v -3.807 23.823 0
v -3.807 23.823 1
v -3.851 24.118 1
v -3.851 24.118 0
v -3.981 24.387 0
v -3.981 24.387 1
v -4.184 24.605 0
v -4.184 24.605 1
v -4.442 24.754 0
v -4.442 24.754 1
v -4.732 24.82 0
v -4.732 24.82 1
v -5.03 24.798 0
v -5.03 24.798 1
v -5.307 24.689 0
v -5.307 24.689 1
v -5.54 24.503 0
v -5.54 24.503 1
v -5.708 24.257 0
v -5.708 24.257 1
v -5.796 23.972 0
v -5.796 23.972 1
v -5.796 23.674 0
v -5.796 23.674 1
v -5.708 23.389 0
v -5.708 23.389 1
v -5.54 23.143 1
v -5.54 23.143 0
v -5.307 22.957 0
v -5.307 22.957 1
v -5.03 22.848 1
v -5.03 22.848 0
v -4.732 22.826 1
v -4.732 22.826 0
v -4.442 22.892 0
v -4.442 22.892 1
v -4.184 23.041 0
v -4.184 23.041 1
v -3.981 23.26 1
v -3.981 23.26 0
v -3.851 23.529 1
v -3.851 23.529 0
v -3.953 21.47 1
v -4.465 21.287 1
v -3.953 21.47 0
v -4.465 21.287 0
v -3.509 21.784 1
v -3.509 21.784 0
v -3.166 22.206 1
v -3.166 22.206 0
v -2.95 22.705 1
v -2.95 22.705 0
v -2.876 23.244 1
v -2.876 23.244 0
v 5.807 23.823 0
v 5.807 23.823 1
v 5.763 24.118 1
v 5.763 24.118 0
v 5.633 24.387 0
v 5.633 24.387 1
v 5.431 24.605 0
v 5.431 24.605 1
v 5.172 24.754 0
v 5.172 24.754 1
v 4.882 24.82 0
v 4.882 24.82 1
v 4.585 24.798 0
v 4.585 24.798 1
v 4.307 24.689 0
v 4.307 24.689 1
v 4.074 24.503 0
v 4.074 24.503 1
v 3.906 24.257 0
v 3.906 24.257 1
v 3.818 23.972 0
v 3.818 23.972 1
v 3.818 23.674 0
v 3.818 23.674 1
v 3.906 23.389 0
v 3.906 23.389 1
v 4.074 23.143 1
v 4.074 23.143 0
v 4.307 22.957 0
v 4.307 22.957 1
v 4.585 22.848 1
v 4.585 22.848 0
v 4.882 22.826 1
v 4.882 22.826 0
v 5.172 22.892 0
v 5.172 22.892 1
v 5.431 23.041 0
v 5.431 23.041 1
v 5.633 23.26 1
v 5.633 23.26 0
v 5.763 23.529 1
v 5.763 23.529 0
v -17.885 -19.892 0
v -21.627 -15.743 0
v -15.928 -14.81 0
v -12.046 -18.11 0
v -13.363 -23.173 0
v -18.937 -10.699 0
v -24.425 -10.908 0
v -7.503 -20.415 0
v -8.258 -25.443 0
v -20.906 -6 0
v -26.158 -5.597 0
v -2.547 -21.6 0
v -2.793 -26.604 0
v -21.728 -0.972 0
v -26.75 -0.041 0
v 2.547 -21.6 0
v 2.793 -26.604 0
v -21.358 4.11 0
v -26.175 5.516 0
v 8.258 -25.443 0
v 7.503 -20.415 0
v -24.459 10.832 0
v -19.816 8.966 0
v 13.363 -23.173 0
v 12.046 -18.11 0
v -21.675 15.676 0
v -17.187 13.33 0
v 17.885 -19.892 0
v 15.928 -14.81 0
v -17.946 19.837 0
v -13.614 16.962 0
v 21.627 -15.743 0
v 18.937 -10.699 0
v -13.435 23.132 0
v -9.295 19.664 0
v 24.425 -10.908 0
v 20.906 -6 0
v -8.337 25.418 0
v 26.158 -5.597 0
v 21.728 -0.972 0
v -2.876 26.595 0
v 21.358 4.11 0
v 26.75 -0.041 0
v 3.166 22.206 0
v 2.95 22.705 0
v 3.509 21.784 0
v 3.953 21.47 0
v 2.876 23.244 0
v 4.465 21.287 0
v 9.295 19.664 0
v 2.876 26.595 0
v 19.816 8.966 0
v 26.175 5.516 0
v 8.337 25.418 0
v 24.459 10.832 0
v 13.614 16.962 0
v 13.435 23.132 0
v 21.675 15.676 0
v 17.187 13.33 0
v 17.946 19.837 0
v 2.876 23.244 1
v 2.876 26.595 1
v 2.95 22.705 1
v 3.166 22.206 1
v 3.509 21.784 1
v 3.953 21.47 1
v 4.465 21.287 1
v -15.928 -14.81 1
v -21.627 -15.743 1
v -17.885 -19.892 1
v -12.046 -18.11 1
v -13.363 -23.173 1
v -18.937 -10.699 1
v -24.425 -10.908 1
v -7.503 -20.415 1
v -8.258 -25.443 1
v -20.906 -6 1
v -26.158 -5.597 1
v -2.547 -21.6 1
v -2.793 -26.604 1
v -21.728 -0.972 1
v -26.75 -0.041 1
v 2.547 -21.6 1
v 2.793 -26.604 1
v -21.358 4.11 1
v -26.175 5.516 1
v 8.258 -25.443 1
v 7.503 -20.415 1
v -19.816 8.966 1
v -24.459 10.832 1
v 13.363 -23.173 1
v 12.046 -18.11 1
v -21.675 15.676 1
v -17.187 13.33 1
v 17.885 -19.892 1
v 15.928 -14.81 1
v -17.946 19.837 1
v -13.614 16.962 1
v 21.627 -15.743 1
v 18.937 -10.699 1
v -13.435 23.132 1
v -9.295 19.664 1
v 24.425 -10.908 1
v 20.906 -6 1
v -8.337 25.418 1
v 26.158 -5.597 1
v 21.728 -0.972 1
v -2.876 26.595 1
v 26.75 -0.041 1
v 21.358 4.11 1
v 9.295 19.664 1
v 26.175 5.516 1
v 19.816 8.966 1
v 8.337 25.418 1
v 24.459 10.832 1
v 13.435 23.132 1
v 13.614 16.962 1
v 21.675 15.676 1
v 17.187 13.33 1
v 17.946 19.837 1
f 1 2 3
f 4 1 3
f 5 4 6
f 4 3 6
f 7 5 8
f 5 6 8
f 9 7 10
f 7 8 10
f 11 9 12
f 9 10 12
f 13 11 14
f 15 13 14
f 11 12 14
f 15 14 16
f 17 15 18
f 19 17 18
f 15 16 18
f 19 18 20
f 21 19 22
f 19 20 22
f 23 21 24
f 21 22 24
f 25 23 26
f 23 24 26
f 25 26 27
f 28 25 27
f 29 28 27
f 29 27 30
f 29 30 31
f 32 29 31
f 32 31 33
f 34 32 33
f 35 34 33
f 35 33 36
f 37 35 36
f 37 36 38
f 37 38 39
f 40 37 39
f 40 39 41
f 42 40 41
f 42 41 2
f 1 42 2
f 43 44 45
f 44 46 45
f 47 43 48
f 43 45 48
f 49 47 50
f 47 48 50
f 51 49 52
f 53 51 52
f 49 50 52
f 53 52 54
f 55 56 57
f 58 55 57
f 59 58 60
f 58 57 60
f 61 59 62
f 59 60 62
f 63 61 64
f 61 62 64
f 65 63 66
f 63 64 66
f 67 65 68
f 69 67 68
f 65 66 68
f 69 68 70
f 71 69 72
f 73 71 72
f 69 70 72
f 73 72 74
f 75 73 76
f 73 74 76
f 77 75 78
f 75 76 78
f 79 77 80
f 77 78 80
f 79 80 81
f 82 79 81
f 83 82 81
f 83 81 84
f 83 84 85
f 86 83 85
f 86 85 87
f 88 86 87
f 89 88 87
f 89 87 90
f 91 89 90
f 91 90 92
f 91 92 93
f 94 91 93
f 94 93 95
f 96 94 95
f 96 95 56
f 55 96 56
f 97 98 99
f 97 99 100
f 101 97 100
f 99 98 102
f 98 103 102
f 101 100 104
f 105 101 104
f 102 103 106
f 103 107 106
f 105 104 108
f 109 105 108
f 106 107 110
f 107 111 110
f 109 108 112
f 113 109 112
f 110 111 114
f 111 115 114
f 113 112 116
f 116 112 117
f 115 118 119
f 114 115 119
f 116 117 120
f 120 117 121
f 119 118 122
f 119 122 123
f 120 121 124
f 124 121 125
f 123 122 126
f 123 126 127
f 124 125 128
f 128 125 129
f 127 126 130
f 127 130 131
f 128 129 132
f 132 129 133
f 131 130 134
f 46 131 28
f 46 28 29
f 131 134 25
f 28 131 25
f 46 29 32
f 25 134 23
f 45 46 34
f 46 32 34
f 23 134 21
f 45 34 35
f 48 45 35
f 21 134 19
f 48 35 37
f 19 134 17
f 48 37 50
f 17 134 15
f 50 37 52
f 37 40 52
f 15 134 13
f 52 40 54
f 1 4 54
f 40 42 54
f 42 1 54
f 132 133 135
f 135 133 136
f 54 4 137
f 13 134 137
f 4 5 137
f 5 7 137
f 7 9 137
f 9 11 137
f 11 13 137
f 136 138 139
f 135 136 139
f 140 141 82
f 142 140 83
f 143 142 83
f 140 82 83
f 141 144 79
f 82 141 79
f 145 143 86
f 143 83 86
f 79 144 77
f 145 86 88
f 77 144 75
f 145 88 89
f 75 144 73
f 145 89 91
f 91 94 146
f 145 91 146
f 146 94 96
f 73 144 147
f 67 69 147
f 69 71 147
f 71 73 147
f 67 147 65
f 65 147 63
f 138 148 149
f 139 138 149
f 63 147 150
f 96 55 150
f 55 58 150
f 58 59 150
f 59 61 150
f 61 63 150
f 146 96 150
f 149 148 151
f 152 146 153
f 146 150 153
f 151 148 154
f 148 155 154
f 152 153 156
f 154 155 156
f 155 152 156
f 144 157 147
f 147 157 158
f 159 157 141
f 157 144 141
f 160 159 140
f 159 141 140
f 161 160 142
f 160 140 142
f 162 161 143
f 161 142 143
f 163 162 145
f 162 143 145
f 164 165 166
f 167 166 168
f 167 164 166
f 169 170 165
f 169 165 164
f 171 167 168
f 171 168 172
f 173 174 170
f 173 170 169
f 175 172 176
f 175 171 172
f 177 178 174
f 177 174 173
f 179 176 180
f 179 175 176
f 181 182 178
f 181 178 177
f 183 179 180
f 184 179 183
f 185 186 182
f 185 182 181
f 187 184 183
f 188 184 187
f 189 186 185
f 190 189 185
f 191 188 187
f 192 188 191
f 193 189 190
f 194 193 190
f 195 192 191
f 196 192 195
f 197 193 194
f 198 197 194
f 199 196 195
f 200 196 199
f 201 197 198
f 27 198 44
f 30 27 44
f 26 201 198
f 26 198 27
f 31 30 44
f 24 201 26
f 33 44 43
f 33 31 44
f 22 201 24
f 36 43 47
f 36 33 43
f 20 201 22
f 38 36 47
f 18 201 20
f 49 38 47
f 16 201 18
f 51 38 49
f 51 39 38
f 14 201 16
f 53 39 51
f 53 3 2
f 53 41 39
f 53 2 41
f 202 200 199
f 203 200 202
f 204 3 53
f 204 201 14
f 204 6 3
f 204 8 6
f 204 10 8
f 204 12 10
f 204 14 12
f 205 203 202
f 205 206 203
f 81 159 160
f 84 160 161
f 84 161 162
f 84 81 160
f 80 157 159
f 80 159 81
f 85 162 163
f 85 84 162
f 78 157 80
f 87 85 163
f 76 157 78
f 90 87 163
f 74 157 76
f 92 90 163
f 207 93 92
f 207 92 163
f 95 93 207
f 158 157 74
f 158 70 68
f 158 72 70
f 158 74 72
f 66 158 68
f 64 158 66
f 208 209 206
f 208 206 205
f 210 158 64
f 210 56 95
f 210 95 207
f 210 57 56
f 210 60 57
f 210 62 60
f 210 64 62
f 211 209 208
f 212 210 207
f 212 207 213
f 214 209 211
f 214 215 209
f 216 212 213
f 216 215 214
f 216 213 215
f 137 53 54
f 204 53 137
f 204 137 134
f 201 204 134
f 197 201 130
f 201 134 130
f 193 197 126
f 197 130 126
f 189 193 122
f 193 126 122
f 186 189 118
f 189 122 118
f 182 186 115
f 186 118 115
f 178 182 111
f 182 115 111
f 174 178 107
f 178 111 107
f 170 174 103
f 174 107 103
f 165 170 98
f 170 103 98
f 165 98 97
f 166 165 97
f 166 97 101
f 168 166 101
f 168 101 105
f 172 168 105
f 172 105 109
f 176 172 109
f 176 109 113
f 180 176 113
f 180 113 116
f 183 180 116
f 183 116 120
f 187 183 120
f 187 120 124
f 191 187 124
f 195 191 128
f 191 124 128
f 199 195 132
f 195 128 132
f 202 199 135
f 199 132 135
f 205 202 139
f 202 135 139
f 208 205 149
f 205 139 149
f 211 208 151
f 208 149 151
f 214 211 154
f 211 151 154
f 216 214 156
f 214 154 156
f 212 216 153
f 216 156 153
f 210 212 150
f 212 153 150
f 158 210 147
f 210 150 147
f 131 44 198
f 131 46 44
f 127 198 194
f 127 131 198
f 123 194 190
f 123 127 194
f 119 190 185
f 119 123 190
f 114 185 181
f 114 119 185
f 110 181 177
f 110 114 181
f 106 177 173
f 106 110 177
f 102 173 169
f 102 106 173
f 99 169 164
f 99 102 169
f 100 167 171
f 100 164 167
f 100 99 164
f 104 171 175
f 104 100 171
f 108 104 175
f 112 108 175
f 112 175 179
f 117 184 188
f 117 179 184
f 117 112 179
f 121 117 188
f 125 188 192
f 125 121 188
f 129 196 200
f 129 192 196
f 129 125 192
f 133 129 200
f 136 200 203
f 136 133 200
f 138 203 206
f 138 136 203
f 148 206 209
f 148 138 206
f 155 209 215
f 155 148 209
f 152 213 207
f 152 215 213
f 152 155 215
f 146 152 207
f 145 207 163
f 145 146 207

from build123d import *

# Parameters (mm, degrees)
SKETCH_1_R          = 26.75
SKETCH_1_R_2        = 21.75
EXTRUDE_1_DEPTH     = 1
SKETCH_2_W          = 5.751238768
SKETCH_2_H          = 20.704459562
CUT_EXTRUDE_1_DEPTH = 10
FILLET_1_R          = 2
SKETCH_3_R          = 1
CUT_EXTRUDE_2_DEPTH = 10


with BuildPart() as part:
    # 草图1 → 拉伸-薄壁1 (new body)
    with BuildSketch(Plane.XY):
        Circle(SKETCH_1_R)
        Circle(SKETCH_1_R_2, mode=Mode.SUBTRACT)
    extrude(amount=EXTRUDE_1_DEPTH)

    # 草图2 → 切除-拉伸1 (cut)
    with BuildSketch(Plane.XY.offset(1)):
        with Locations((0, 17.972621147)):
            Rectangle(SKETCH_2_W, SKETCH_2_H)
    extrude(amount=-CUT_EXTRUDE_1_DEPTH, mode=Mode.SUBTRACT)

    # 圆角1
    fillet_1_edges = [part.edges().sort_by_distance(p)[0] for p in [
        (2.875619384, 21.559065684, 0.5),
        (-2.875619384, 21.559065684, 0.5),
    ]]
    fillet(fillet_1_edges, radius=FILLET_1_R)

    # 草图3 → 切除-拉伸2 (cut)
    with BuildSketch(Plane.XY.offset(1)):
        with Locations((-4.807050905, 23.823279289)):
            Circle(SKETCH_3_R)
        with Locations((4.807050905, 23.823279289)):
            Circle(SKETCH_3_R)
    extrude(amount=-CUT_EXTRUDE_2_DEPTH, mode=Mode.SUBTRACT)


solid = part.part
